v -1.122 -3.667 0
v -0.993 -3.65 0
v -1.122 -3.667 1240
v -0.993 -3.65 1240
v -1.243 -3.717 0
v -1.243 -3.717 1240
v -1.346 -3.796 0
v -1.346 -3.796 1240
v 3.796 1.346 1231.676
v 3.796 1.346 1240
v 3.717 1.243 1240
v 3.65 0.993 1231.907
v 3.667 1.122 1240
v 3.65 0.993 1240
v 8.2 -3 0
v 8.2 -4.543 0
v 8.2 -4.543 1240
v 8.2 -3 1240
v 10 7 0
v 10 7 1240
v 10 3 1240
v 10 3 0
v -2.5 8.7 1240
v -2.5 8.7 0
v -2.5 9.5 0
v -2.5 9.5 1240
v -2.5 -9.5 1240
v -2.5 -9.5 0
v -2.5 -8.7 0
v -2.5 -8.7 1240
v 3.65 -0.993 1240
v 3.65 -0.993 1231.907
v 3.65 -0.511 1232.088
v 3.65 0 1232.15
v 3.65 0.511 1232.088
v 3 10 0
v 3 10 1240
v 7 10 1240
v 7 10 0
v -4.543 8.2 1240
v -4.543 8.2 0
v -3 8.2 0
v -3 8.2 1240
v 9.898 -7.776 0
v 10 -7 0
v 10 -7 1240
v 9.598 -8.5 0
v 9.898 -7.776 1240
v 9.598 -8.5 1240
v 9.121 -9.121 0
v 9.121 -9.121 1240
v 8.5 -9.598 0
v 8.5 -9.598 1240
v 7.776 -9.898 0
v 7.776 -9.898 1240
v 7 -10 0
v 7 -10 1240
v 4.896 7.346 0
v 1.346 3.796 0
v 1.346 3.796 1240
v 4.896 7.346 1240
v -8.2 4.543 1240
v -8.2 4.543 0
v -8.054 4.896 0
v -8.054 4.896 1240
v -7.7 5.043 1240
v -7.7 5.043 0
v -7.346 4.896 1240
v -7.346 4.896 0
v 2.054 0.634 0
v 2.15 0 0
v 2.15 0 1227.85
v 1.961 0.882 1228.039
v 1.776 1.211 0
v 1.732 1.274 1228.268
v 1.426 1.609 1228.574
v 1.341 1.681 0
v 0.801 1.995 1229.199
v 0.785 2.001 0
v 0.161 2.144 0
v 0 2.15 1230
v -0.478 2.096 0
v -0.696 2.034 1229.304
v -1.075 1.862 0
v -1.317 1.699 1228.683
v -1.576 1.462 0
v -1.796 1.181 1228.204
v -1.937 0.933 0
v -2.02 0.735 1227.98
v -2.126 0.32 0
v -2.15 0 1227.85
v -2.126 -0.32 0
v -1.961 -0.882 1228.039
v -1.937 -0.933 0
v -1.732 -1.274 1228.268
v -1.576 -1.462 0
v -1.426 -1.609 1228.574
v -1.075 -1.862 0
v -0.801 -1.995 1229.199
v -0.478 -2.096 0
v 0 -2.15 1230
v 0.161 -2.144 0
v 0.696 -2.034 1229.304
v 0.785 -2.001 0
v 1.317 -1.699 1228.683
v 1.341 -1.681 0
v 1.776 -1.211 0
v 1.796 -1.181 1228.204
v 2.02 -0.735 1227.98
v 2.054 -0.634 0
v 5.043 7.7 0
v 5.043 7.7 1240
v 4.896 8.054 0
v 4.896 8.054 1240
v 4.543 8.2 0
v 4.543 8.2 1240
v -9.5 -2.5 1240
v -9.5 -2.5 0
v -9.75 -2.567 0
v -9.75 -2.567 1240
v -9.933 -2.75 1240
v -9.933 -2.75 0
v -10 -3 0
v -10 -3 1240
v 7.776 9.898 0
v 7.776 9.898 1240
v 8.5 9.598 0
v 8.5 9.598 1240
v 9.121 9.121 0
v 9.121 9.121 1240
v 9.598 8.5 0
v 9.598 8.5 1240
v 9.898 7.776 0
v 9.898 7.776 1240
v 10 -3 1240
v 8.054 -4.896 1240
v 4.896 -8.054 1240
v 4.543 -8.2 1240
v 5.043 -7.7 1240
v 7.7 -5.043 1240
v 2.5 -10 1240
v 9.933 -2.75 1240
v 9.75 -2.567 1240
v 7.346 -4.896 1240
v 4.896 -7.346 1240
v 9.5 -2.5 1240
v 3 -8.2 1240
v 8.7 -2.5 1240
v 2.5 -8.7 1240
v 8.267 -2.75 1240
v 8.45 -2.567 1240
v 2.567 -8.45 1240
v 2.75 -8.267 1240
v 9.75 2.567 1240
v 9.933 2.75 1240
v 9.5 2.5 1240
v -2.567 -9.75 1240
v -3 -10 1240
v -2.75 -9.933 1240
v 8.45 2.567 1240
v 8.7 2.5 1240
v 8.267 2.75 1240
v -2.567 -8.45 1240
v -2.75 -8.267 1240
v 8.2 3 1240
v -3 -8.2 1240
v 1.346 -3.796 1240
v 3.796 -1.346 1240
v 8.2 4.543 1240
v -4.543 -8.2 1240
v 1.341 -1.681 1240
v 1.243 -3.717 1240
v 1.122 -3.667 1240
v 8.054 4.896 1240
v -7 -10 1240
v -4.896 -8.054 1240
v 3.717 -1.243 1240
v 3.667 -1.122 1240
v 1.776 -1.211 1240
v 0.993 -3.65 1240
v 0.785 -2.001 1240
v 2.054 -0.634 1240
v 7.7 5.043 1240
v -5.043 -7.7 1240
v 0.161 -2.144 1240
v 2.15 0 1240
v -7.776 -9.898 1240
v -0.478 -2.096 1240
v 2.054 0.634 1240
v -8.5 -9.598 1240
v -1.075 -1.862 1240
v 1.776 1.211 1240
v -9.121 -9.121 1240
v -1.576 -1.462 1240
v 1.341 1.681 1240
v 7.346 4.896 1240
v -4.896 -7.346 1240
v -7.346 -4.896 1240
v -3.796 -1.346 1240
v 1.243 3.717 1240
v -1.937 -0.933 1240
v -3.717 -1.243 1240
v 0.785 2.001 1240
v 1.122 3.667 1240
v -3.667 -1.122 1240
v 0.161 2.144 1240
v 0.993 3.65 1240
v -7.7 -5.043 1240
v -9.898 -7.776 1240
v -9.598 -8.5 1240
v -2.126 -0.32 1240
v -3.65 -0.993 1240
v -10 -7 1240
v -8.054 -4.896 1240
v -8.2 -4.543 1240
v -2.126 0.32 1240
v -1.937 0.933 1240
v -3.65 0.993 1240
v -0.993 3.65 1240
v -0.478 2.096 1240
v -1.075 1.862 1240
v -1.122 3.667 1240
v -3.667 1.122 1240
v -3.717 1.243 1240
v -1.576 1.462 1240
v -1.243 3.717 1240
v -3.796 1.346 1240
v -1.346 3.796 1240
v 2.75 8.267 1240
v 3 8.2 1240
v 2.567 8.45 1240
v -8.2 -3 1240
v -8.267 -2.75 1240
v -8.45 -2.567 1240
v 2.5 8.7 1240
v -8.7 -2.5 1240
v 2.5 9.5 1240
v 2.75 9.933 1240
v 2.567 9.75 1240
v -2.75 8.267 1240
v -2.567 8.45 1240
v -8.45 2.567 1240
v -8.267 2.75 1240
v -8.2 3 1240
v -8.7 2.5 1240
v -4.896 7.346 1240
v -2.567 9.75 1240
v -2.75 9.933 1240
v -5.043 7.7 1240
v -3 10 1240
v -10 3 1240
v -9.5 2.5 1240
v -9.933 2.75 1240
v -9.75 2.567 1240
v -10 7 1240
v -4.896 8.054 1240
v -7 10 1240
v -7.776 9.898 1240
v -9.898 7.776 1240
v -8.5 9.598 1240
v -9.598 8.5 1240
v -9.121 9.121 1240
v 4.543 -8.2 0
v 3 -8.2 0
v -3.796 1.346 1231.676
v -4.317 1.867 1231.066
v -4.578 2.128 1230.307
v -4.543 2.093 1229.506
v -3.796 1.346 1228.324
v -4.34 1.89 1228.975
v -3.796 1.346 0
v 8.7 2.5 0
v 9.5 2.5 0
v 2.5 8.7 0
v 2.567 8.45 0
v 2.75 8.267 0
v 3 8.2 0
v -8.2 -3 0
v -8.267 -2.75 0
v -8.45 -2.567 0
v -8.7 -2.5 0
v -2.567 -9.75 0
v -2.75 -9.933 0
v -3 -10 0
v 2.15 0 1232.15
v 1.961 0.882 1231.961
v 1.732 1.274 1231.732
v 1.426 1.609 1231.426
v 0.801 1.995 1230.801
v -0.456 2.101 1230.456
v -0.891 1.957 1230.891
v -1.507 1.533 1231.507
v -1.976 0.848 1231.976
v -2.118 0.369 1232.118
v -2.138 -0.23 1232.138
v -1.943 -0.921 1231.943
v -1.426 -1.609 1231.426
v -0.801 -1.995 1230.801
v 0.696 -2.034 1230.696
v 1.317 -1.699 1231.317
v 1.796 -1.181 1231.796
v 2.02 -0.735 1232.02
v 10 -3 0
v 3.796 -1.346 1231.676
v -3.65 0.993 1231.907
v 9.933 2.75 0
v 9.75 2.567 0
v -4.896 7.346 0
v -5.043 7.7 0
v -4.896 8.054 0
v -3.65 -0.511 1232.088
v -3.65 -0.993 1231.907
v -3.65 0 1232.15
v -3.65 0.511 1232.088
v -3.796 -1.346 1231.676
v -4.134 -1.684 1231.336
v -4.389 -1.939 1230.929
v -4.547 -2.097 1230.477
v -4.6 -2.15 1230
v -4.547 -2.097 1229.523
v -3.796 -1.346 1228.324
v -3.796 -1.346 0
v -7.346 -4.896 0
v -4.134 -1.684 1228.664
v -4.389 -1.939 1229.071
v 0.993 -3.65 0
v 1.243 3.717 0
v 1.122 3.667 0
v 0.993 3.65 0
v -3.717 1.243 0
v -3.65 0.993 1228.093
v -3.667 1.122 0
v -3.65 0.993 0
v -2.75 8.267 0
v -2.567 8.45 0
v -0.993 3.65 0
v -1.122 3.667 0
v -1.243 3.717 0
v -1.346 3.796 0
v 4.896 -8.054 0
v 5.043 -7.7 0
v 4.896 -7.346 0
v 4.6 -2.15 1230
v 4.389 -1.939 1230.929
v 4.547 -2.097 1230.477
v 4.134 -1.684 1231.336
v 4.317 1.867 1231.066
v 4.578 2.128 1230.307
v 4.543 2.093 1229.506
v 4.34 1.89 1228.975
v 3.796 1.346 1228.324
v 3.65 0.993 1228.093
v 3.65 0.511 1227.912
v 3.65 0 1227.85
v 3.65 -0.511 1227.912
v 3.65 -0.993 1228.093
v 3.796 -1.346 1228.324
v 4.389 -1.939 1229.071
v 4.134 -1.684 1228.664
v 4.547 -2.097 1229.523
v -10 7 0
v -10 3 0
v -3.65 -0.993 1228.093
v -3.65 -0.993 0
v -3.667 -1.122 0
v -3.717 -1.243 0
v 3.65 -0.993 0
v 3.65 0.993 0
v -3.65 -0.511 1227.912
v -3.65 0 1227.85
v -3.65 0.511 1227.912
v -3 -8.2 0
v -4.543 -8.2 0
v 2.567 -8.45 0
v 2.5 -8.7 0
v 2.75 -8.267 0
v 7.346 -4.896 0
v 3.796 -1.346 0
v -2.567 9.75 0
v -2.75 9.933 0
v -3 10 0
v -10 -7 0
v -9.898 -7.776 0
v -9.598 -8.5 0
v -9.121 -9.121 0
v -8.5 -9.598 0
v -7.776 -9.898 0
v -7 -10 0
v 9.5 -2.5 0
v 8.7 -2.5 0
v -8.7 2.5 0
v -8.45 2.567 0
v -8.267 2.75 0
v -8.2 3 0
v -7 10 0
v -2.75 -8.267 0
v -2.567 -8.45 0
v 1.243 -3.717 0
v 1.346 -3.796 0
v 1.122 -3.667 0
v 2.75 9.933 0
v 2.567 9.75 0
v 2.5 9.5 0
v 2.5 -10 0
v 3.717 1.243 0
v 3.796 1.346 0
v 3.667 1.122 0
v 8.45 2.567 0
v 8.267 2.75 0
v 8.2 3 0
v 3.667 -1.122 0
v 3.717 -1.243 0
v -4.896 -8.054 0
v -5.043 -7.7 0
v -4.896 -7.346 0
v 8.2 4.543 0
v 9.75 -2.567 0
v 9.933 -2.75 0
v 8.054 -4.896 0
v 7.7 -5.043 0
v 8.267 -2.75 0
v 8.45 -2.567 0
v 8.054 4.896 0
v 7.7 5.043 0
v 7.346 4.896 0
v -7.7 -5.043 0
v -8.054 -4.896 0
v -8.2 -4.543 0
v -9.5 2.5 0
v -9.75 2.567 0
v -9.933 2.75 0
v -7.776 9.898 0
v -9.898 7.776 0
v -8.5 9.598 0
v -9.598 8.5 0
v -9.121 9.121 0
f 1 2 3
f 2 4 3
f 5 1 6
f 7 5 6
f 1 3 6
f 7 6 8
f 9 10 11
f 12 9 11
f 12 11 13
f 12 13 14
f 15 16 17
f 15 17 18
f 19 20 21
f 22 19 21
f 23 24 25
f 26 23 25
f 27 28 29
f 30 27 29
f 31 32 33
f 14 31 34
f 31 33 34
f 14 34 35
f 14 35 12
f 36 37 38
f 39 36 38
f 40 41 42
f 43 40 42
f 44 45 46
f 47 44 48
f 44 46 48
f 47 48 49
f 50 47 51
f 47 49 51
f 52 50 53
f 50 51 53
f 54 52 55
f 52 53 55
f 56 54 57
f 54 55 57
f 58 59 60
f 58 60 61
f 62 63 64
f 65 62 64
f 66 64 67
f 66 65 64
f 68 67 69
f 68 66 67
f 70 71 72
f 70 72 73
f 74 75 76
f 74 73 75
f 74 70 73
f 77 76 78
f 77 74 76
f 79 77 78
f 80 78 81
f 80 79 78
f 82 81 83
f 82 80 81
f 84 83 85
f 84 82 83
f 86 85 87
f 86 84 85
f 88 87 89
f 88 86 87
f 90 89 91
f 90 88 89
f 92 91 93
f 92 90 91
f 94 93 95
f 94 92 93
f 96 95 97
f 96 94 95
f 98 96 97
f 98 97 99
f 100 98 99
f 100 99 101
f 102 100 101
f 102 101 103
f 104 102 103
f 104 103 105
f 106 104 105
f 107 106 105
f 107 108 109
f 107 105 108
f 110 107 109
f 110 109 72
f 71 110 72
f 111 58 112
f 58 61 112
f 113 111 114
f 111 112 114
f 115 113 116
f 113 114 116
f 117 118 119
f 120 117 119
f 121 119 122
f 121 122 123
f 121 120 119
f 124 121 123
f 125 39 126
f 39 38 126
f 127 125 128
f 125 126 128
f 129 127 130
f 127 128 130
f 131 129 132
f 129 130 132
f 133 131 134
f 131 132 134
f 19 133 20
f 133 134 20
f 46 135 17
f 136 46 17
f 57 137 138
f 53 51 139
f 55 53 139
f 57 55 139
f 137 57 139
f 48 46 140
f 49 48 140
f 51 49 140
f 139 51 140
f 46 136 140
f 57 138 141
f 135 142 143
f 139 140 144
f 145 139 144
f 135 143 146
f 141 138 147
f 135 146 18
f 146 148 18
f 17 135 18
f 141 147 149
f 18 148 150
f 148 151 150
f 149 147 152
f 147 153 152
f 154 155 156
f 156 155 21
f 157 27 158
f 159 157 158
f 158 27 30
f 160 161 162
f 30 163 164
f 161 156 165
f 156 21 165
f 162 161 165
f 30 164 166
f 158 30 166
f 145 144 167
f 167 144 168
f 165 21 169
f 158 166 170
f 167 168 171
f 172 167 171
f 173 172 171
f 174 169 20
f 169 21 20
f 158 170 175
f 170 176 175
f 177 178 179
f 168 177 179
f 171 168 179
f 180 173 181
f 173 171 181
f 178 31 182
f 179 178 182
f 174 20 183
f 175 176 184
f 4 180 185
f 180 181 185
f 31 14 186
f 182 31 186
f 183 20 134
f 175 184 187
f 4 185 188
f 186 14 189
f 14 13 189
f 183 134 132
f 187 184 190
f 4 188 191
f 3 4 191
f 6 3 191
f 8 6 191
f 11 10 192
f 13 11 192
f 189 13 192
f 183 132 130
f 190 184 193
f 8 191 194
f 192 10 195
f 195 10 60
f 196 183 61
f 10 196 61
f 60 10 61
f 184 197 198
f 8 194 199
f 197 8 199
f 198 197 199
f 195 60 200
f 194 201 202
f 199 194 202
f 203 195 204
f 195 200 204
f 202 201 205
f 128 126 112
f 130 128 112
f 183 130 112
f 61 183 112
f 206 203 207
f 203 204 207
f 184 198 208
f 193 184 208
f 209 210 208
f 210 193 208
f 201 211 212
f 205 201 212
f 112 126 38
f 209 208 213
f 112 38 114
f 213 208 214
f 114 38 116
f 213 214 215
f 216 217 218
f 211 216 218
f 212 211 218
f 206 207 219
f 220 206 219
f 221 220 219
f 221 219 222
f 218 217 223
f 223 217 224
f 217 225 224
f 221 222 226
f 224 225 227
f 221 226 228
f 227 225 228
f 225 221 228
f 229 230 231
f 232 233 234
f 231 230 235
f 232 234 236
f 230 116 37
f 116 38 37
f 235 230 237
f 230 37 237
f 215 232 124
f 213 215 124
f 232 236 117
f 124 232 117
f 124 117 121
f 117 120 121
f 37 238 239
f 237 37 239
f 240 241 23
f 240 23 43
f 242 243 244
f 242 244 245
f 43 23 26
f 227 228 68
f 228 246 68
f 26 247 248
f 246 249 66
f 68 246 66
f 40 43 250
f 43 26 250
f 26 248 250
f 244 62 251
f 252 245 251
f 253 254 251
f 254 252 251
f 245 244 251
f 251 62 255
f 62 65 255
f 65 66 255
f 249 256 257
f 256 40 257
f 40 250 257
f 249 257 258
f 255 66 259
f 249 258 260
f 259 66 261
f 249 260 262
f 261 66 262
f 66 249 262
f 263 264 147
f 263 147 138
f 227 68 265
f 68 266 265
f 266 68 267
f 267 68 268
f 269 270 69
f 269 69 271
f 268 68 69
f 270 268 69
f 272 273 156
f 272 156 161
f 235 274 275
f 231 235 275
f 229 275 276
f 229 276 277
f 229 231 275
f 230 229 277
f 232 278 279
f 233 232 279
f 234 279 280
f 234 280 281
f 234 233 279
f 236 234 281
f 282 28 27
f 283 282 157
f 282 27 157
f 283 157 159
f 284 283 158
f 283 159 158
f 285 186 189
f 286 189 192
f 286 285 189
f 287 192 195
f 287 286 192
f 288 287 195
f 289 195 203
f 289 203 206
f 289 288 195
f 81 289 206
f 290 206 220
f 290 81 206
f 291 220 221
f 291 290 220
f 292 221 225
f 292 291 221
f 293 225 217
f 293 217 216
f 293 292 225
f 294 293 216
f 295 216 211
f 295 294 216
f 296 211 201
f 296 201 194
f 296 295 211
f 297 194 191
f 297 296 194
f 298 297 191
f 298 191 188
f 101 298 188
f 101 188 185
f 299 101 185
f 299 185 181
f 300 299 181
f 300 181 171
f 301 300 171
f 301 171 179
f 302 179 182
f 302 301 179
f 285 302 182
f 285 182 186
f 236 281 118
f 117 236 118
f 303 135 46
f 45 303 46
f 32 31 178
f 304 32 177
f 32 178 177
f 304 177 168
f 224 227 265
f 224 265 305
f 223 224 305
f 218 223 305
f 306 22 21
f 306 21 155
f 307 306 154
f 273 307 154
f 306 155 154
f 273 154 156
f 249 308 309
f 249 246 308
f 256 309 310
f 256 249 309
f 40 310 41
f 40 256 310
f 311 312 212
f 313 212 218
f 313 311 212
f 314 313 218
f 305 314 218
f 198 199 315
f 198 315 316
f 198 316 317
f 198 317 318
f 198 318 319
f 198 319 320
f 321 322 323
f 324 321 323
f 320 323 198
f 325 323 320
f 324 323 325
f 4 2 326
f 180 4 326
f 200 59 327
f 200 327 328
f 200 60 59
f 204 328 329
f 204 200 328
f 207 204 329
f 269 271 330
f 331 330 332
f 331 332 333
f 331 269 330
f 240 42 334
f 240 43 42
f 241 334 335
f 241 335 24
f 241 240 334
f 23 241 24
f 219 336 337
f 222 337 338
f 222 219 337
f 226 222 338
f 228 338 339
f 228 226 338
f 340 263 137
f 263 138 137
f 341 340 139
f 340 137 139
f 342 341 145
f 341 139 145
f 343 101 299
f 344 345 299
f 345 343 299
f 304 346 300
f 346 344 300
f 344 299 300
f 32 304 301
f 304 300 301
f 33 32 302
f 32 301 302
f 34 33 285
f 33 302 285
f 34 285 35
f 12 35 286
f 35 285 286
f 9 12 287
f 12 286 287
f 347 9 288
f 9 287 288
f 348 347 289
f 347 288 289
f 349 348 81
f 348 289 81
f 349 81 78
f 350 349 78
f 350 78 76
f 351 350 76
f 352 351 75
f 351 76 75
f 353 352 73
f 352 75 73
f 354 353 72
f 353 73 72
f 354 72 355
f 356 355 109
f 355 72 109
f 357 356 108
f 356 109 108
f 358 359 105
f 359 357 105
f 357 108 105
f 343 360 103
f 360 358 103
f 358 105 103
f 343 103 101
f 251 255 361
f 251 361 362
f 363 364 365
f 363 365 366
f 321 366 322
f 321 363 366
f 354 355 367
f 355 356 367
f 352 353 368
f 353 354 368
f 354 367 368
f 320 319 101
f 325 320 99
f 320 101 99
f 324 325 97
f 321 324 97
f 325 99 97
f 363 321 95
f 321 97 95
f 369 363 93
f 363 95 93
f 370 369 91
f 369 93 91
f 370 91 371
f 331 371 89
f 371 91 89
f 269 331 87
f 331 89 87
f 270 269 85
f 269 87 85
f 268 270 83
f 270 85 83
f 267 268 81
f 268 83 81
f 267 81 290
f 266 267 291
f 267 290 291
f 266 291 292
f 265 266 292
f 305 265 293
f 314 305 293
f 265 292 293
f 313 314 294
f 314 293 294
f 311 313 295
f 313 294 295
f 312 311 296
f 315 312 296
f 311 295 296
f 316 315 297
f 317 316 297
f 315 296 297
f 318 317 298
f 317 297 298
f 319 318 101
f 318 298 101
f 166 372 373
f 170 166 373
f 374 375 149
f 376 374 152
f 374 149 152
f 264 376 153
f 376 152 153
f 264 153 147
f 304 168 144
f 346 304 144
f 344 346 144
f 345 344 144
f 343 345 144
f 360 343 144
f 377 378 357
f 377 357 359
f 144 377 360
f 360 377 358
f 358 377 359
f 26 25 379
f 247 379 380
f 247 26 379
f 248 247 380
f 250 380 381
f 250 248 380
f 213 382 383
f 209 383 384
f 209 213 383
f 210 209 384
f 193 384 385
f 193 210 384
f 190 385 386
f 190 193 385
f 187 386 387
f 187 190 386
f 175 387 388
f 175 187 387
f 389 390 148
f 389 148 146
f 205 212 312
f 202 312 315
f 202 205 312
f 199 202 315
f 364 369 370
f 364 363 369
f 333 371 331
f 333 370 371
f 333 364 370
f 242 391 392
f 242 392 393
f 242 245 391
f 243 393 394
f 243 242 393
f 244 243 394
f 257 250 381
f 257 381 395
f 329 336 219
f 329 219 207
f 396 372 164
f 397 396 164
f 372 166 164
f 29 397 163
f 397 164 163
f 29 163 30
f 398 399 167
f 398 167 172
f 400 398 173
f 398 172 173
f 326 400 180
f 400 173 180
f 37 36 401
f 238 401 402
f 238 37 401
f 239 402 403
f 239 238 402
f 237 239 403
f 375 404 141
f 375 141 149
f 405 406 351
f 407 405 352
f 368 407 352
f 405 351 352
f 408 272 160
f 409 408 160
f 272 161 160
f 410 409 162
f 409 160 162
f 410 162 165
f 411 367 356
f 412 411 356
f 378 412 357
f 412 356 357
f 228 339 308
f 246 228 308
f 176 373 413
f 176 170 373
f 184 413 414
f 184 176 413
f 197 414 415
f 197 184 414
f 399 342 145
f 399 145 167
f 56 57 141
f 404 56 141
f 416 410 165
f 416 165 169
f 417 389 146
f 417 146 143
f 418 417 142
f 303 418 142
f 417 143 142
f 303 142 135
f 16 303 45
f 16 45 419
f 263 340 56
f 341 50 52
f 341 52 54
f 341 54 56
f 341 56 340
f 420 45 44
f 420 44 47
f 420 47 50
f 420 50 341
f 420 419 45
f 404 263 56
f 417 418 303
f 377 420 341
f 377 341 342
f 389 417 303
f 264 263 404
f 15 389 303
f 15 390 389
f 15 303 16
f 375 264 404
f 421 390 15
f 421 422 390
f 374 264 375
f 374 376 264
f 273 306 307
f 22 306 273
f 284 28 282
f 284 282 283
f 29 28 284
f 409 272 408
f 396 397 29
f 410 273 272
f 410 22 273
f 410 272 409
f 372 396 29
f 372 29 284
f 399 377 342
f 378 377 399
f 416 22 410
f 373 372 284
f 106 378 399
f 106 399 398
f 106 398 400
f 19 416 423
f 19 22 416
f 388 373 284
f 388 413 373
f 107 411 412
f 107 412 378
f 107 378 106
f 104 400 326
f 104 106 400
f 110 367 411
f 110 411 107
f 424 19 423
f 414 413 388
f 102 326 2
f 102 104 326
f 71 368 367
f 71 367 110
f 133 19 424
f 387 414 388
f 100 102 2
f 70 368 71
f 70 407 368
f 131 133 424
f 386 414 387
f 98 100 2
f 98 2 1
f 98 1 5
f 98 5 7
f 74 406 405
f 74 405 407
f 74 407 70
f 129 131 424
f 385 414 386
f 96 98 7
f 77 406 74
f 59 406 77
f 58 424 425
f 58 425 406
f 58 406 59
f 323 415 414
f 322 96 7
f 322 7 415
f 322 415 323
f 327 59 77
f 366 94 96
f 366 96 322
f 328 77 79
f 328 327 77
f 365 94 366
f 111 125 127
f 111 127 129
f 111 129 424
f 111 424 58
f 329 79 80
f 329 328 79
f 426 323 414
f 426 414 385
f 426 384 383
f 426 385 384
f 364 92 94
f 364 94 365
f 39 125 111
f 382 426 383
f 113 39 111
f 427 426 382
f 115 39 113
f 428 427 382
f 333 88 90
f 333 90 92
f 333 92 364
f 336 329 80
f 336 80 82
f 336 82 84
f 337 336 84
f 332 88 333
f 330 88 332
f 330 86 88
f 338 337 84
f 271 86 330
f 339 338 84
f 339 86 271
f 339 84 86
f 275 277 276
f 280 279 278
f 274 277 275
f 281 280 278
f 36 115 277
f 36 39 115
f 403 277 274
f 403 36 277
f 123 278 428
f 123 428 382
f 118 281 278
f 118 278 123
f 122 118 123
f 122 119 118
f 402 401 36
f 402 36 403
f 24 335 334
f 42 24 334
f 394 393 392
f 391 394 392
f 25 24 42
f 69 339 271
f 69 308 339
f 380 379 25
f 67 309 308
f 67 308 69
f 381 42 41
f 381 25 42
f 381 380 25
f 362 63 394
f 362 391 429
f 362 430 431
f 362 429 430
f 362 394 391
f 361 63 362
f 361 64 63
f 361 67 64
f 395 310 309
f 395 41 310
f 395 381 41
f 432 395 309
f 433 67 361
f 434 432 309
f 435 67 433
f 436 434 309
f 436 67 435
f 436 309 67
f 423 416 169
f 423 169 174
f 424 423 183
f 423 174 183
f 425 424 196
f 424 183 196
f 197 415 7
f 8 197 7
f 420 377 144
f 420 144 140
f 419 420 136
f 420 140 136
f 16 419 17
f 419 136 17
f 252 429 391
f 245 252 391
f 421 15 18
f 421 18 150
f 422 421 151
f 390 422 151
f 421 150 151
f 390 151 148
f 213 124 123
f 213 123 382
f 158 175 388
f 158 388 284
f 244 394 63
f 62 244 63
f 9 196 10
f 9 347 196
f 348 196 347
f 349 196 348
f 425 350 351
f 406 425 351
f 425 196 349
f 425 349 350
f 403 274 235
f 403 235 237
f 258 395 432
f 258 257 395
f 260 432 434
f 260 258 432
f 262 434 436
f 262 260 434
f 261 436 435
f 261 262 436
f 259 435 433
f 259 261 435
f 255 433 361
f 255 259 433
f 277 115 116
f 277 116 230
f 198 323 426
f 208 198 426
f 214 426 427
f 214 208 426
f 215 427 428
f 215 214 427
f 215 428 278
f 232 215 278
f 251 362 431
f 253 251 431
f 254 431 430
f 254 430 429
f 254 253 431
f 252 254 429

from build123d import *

# Parameters (mm, degrees)
SKETCH1_W           = 7.3
SKETCH1_H           = 7.3
SKETCH1_R           = 2.15
BOSS_EXTRUDE1_DEPTH = 1240
BOSS_EXTRUDE2_DEPTH = 1240
FILLET4_R           = 3
FILLET5_R           = 0.5
FILLET6_R           = 0.5
FILLET7_R           = 0.5
SKETCH5_R           = 2.15
CUT_EXTRUDE3_DEPTH  = 1241.115447247
SKETCH6_R           = 2.15
CUT_EXTRUDE4_DEPTH  = 1241.115447347


with BuildPart() as part:
    # Sketch1 → Boss-Extrude1 (new body)
    with BuildSketch(Plane.XY):
        Rectangle(SKETCH1_W, SKETCH1_H)
        Circle(SKETCH1_R, mode=Mode.SUBTRACT)
    extrude(amount=BOSS_EXTRUDE1_DEPTH)

    # Sketch2 → Boss-Extrude2 (add)
    with BuildSketch(Plane.XY):
        Polygon((3.65, 3.65), (1.2, 3.65), (5.750000001, 8.200000001), (2.500000001, 8.200000001), (2.500000001, 10.000000001), (10.000000001, 10.000000001), (10.000000001, 2.500000001), (8.200000001, 2.500000001), (8.200000001, 5.750000001), (3.65, 1.2), align=None)
        Polygon((-3.65, 3.65), (-1.2, 3.65), (-5.750000001, 8.200000001), (-2.500000001, 8.200000001), (-2.500000001, 10.000000001), (-10.000000001, 10.000000001), (-10.000000001, 2.500000001), (-8.200000001, 2.500000001), (-8.200000001, 5.750000001), (-3.65, 1.2), align=None)
        Polygon((-3.65, -3.65), (-3.65, -1.2), (-8.200000001, -5.750000001), (-8.200000001, -2.500000001), (-10.000000001, -2.500000001), (-10.000000001, -10.000000001), (-2.500000001, -10.000000001), (-2.500000001, -8.200000001), (-5.750000001, -8.200000001), (-1.2, -3.65), align=None)
        Polygon((3.65, -3.65), (3.65, -1.2), (8.200000001, -5.750000001), (8.200000001, -2.500000001), (10.000000001, -2.500000001), (10.000000001, -10.000000001), (2.500000001, -10.000000001), (2.500000001, -8.200000001), (5.750000001, -8.200000001), (1.2, -3.65), align=None)
    extrude(amount=BOSS_EXTRUDE2_DEPTH)

    # Fillet4
    fillet4_edges = [part.edges().sort_by_distance(p)[0] for p in [
        (10.000000001, 10.000000001, 620),
        (-10.000000001, 10.000000001, 620),
        (-10.000000001, -10.000000001, 620),
        (10.000000001, -10.000000001, 620),
    ]]
    fillet(fillet4_edges, radius=FILLET4_R)

    # Fillet5
    fillet5_edges = [part.edges().sort_by_distance(p)[0] for p in [
        (8.200000001, 2.500000001, 620),
        (10.000000001, 2.500000001, 620),
        (2.500000001, 10.000000001, 620),
        (2.500000001, 8.200000001, 620),
        (-2.500000001, 8.200000001, 620),
        (-2.500000001, 10.000000001, 620),
        (-10.000000001, 2.500000001, 620),
        (-8.200000001, 2.500000001, 620),
        (-8.200000001, -2.500000001, 620),
        (-10.000000001, -2.500000001, 620),
        (-2.500000001, -10.000000001, 620),
        (-2.500000001, -8.200000001, 620),
        (2.500000001, -8.200000001, 620),
        (10.000000001, -2.500000001, 620),
        (8.200000001, -2.500000001, 620),
    ]]
    fillet(fillet5_edges, radius=FILLET5_R)

    # Fillet6
    fillet6_edges = [part.edges().sort_by_distance(p)[0] for p in [
        (3.65, 1.2, 620),
        (1.2, 3.65, 620),
        (-3.65, 1.2, 620),
        (-1.2, 3.65, 620),
        (-1.2, -3.65, 620),
        (-3.65, -1.2, 620),
        (1.2, -3.65, 620),
        (3.65, -1.2, 620),
    ]]
    fillet(fillet6_edges, radius=FILLET6_R)

    # Fillet7
    fillet7_edges = [part.edges().sort_by_distance(p)[0] for p in [
        (8.200000001, 5.750000001, 620),
        (5.750000001, 8.200000001, 620),
        (-5.750000001, 8.200000001, 620),
        (-8.200000001, 5.750000001, 620),
        (-8.200000001, -5.750000001, 620),
        (-5.750000001, -8.200000001, 620),
        (5.750000001, -8.200000001, 620),
        (8.200000001, -5.750000001, 620),
    ]]
    fillet(fillet7_edges, radius=FILLET7_R)

    # Sketch5 → Cut-Extrude3 (cut, through all)
    with BuildSketch(Plane.ZY.offset(3.65)):
        with Locations(Location((1230, 0, 0), (0, 0, 270))):
            Circle(SKETCH5_R)
    extrude(amount=-CUT_EXTRUDE3_DEPTH, mode=Mode.SUBTRACT)

    # Sketch6 → Cut-Extrude4 (cut, through all)
    with BuildSketch(Plane(origin=(3.65, 0, 0), x_dir=(0, 0, -1), z_dir=(1, 0, 0))):
        with Locations(Location((-1230, 0, 0), (0, 0, 270))):
            Circle(SKETCH6_R)
    extrude(amount=-CUT_EXTRUDE4_DEPTH, mode=Mode.SUBTRACT)


solid = part.part
